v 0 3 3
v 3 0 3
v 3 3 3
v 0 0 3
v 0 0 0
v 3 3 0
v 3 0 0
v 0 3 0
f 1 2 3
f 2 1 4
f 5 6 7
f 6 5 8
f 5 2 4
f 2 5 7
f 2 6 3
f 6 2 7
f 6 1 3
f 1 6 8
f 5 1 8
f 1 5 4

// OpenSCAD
/* [Parameters] */
scale_by = 3;

/* [Hidden] */

// onescad: lib.scad

scale_by__1 = 10;

function scaled(n, k = scale_by__1) = n * k;

// onescad: main.scad

echo(scaled(2));

echo(scaled(2, scale_by));

module box(s = scale_by) { cube(s); }

box();
